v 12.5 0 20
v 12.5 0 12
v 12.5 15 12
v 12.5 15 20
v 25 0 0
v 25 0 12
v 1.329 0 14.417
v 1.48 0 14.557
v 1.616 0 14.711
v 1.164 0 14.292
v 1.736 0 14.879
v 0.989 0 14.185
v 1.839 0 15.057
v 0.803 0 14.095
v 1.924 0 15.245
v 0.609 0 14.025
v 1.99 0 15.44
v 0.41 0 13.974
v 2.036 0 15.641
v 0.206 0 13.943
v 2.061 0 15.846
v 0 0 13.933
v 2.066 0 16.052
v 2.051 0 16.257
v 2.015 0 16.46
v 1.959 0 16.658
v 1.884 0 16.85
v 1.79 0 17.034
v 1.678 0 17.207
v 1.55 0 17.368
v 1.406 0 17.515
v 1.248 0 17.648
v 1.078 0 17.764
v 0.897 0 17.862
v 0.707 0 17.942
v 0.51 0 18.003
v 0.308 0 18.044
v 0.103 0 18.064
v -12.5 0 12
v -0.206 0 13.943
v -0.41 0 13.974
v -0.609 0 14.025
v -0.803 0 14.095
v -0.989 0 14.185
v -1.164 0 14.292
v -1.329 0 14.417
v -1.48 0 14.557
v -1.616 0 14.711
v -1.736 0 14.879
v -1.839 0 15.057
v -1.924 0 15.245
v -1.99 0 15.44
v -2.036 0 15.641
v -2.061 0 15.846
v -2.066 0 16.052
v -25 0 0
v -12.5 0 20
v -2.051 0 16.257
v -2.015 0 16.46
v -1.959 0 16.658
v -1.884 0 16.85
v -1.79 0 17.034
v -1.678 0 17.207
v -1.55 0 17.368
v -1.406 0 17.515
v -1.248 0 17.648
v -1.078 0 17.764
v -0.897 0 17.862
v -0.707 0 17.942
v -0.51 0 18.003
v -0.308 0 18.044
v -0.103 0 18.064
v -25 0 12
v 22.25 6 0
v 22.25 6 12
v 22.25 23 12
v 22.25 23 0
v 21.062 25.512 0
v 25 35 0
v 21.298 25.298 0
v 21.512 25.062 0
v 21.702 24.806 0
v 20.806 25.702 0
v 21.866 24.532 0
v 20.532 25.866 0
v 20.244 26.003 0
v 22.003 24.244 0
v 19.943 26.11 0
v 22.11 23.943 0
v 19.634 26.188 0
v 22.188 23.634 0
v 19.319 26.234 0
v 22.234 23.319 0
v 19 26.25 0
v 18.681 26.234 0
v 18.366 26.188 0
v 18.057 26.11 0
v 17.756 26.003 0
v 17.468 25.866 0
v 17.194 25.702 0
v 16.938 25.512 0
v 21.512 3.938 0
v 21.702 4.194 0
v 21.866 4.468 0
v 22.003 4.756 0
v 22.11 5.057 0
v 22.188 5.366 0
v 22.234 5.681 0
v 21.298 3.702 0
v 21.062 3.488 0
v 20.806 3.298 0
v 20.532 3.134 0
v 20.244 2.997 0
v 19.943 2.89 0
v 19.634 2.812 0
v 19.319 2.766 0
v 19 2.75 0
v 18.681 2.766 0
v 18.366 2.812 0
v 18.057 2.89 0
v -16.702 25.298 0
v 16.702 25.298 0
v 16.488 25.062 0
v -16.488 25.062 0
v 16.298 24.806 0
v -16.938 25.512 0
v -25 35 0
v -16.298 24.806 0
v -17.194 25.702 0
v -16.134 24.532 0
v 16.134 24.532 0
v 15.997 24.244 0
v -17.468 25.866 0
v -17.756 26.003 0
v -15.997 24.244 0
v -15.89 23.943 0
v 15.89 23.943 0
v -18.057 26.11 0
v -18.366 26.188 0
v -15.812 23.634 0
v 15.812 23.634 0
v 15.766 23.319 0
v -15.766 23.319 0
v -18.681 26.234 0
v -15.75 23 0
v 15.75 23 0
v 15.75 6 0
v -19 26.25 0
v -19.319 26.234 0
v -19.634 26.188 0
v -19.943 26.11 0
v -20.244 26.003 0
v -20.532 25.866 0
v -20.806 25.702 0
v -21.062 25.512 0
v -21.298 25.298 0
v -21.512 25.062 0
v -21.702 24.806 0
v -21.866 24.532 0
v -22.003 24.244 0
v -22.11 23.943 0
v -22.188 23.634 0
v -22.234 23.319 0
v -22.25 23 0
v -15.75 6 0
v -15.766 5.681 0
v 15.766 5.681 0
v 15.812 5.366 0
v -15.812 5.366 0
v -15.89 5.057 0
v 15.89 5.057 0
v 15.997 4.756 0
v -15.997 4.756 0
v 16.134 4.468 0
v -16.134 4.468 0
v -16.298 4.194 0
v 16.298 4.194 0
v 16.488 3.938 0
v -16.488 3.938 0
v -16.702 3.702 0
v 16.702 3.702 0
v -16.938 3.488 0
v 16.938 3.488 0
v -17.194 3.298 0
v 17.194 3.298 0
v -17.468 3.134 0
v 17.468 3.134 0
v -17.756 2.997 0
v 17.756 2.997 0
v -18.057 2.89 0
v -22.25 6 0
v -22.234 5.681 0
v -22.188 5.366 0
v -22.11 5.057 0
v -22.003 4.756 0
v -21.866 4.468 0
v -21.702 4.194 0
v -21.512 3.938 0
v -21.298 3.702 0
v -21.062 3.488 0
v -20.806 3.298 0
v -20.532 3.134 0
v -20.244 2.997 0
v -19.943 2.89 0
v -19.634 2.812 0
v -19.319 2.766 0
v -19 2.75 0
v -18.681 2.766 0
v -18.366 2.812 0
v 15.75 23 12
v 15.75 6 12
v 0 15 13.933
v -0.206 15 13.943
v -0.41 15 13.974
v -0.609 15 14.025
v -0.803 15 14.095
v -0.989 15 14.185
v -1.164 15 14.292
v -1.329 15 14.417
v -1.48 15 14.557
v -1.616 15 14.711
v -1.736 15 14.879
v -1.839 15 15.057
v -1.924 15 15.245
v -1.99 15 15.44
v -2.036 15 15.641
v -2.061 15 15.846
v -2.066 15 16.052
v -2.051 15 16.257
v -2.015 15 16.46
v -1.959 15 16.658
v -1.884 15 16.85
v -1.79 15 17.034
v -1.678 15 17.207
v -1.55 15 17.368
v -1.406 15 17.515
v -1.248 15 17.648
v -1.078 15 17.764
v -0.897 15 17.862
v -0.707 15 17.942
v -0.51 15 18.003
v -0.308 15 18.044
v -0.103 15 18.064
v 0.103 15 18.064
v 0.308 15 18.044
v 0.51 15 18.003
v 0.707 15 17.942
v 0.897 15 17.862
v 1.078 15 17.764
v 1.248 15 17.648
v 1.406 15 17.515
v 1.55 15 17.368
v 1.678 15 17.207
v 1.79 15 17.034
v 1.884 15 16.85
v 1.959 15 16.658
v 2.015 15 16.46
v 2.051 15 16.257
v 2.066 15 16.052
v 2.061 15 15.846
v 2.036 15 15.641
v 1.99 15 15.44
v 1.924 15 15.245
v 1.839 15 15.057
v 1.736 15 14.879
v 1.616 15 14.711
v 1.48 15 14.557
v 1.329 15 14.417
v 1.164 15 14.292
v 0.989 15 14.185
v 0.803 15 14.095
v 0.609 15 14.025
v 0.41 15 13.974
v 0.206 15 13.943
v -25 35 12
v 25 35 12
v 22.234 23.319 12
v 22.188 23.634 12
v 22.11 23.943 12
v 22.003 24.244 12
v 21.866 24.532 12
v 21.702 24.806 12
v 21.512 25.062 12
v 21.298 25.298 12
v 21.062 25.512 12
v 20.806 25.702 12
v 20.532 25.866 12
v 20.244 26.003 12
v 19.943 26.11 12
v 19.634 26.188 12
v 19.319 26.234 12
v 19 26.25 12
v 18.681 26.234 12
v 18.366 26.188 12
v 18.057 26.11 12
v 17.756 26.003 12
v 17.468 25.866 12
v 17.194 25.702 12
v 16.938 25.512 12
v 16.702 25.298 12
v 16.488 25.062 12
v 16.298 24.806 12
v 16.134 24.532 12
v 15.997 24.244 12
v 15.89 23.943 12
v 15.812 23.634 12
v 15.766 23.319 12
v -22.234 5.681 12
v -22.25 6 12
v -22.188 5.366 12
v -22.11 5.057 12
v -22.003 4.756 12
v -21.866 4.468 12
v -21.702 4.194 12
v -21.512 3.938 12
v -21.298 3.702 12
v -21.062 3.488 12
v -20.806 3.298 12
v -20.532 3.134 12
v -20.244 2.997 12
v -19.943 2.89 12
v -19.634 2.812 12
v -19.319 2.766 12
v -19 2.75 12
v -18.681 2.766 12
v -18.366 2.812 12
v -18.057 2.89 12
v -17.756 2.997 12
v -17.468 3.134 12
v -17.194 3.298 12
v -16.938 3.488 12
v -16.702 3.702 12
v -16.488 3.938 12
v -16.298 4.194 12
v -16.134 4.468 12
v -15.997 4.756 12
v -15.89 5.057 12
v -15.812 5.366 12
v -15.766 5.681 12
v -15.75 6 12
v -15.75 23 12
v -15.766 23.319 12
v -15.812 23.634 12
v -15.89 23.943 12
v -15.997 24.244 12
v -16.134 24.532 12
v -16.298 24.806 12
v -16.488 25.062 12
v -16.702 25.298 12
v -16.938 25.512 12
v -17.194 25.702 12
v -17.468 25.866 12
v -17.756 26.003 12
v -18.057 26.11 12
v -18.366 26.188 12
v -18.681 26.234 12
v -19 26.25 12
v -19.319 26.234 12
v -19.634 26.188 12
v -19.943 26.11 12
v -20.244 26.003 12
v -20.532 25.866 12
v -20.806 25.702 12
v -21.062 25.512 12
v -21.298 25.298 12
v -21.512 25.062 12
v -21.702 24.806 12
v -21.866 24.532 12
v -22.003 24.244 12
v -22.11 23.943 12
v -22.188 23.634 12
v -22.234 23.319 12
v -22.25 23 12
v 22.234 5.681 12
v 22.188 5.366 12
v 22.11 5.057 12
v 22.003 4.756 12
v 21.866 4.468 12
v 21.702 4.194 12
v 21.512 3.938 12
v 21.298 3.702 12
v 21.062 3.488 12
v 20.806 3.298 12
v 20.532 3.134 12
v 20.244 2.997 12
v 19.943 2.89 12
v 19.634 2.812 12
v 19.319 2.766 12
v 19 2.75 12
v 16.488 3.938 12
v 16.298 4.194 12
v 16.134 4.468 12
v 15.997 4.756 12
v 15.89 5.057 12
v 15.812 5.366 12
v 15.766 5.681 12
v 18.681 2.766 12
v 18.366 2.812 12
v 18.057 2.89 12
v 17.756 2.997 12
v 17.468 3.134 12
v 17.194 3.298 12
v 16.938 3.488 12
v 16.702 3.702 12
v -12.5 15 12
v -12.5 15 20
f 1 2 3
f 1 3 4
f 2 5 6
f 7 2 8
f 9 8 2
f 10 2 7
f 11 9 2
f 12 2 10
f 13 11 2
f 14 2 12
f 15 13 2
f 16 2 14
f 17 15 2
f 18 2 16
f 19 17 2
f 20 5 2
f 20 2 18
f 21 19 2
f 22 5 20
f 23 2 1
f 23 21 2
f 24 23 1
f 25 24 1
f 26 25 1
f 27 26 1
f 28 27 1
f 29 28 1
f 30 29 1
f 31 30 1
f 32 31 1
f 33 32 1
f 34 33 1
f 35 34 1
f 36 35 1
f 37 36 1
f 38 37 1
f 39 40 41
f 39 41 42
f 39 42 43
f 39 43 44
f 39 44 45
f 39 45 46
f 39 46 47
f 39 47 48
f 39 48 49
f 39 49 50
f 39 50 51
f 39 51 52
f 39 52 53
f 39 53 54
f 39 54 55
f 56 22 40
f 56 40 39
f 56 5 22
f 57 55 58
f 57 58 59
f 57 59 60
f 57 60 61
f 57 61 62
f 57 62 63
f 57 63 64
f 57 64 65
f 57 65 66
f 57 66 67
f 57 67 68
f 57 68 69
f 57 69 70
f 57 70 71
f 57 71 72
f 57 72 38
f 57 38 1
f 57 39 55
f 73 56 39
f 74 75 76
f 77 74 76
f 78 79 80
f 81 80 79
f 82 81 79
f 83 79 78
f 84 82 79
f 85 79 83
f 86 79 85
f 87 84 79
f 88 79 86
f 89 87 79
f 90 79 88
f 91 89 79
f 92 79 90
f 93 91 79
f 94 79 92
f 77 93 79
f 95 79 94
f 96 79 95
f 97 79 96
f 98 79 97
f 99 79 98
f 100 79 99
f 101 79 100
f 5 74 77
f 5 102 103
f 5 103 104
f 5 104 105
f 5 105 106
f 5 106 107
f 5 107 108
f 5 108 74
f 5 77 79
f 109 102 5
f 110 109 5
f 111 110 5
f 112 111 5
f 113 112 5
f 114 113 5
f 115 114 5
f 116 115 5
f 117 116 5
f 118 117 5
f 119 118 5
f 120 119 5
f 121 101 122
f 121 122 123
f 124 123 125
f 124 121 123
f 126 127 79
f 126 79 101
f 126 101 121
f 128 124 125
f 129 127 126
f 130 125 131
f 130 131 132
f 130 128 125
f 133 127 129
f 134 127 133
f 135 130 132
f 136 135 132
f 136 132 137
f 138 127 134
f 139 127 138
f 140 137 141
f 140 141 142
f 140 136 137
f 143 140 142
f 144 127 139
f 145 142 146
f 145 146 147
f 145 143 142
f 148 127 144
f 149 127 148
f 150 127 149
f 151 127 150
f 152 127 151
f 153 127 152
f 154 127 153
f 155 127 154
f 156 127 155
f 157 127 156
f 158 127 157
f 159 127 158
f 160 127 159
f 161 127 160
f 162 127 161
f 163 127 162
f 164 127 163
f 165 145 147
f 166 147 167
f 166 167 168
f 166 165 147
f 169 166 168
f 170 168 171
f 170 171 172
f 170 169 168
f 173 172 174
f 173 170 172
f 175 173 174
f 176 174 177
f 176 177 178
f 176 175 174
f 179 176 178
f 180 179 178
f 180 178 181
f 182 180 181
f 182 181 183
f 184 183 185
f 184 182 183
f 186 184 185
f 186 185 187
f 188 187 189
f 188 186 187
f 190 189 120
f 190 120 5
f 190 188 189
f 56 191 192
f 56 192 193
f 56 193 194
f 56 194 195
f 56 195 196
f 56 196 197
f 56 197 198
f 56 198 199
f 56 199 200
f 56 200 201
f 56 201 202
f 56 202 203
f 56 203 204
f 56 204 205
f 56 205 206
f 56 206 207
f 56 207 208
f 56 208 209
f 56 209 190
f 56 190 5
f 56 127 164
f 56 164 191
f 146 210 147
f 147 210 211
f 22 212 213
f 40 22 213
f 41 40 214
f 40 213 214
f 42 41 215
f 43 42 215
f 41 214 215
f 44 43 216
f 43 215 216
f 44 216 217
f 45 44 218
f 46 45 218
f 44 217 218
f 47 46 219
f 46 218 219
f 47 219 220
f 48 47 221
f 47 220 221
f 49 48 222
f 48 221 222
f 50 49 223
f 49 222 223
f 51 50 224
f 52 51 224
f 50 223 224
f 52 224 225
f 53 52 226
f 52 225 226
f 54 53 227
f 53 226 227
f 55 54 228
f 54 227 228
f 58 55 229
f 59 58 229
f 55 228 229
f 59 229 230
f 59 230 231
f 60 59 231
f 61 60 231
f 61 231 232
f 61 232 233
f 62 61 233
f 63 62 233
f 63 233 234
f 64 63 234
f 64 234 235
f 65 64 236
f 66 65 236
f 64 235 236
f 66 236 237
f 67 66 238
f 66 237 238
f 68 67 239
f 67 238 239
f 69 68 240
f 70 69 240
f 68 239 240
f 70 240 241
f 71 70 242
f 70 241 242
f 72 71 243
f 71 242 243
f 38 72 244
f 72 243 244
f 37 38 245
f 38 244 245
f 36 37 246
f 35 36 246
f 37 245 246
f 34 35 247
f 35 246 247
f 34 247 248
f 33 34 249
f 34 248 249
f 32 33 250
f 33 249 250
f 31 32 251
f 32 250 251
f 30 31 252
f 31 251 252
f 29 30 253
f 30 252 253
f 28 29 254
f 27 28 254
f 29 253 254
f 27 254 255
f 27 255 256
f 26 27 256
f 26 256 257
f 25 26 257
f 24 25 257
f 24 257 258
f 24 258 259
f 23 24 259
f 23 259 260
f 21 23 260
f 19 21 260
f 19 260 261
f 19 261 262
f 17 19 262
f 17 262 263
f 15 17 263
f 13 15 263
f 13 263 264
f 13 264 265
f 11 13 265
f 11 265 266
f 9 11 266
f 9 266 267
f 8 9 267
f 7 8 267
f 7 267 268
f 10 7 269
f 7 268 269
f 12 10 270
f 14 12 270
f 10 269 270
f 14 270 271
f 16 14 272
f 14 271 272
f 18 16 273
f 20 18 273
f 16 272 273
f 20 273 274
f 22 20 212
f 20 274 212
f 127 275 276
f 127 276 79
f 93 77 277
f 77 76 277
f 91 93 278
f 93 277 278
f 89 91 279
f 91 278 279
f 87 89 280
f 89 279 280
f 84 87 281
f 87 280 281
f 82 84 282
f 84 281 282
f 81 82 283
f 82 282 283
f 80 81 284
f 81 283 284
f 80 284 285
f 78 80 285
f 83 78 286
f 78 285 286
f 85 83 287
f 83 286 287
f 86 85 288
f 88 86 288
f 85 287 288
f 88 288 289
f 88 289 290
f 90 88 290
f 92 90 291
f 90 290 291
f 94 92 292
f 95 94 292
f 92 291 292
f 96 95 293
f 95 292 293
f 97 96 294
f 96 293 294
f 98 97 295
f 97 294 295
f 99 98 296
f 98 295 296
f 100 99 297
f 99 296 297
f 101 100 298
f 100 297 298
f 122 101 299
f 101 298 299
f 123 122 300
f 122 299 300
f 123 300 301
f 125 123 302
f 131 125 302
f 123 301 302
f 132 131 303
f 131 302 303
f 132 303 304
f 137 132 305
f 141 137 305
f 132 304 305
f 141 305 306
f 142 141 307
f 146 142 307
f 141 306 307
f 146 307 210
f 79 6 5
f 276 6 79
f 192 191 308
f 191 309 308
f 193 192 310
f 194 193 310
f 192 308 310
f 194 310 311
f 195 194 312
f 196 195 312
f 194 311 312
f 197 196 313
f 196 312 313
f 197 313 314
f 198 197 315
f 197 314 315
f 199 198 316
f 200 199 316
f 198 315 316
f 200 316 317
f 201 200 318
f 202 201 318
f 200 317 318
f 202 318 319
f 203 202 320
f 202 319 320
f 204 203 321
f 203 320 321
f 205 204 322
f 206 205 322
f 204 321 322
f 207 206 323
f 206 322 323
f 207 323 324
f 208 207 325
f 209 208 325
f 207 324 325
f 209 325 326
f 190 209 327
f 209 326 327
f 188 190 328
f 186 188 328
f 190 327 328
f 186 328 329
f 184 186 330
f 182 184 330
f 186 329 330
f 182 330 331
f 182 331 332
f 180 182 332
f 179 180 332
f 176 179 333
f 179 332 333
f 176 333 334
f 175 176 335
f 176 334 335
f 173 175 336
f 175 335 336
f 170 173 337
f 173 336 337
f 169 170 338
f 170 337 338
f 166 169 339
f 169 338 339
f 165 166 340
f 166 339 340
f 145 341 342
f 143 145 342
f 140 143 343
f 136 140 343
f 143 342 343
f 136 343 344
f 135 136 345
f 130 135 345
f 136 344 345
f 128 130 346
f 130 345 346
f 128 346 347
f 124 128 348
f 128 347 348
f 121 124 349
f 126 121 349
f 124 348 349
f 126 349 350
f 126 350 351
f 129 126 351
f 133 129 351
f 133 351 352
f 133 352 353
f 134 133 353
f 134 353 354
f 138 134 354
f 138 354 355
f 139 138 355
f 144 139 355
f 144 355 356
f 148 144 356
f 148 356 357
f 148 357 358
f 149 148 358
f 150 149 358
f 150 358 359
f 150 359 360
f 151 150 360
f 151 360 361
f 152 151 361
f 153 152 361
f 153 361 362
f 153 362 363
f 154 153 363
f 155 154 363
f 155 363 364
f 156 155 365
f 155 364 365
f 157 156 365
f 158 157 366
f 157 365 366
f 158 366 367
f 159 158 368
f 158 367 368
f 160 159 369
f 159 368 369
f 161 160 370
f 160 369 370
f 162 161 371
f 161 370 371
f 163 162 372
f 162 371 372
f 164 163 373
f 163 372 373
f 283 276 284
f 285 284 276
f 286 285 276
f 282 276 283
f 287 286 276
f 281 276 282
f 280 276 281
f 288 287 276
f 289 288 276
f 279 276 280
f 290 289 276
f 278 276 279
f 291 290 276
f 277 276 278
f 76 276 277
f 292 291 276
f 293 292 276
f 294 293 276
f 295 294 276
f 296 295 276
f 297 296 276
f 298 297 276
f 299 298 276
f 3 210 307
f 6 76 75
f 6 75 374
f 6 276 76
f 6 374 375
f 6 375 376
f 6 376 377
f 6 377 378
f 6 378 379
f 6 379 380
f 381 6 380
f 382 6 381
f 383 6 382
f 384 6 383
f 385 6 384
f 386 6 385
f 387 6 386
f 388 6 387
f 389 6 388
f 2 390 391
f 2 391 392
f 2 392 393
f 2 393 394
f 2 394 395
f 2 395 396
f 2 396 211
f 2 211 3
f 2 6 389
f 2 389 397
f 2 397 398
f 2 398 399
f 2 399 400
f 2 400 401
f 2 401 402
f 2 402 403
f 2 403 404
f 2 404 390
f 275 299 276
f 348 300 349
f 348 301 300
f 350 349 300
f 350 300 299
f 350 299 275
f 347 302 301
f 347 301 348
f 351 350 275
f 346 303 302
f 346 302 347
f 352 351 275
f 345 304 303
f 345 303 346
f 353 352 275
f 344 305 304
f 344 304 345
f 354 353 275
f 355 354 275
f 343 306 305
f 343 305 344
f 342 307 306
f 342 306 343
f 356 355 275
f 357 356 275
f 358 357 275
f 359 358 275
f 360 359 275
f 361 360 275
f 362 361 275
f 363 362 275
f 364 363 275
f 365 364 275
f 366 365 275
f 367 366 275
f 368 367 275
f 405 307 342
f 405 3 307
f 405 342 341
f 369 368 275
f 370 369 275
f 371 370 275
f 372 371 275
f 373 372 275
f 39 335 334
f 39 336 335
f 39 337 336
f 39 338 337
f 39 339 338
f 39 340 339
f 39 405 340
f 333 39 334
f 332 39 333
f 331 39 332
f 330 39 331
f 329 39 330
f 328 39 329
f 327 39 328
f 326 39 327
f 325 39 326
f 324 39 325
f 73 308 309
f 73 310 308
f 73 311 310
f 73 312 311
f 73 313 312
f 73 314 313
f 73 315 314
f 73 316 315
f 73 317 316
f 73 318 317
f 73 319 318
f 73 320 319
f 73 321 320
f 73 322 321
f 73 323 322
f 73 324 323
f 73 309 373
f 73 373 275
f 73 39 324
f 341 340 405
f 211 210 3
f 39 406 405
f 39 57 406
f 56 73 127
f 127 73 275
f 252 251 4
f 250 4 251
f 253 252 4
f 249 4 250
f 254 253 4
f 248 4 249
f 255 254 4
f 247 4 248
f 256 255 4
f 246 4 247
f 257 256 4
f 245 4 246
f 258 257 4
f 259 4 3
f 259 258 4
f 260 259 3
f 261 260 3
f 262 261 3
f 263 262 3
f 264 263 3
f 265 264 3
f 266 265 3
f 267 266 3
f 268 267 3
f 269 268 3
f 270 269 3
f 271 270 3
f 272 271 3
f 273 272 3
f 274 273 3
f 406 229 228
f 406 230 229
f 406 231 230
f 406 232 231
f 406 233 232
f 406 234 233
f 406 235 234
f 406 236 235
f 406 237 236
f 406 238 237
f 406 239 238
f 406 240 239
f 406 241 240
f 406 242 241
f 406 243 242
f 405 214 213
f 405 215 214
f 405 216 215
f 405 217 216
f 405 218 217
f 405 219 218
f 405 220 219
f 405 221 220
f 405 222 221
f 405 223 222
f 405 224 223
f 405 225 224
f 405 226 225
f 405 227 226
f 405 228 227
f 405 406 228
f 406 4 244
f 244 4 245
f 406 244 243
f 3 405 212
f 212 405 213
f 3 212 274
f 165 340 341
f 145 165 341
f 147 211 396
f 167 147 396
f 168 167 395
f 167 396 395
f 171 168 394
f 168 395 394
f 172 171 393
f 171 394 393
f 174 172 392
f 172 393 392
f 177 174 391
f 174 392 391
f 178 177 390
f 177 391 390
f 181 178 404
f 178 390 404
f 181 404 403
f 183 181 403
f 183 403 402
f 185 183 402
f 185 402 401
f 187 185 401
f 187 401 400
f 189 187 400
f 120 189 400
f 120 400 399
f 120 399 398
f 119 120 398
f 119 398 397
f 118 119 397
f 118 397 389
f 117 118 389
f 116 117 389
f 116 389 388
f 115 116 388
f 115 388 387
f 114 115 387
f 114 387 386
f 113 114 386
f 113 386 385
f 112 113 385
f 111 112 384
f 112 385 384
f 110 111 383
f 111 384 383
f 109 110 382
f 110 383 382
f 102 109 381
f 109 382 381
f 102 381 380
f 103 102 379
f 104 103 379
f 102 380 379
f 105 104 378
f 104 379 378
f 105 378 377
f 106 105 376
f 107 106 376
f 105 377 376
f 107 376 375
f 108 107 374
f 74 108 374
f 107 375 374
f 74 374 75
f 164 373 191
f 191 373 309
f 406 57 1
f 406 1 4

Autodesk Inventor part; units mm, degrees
ref_plane "YZ Plane" through (0, 0, 0) normal (1, 0, 0) x (0, 1, 0)
ref_plane "XZ Plane" through (0, 0, 0) normal (0, 1, 0) x (-1, 0, 0)
ref_plane "XY Plane" through (0, 0, 0) normal (0, 0, 1) x (1, 0, 0)
sketch "Sketch1" plane through (0, 0, 0) normal (1, 0, 0) x (0, 1, 0)
  line L0 (0, 20) -> (15, 20)
  line L1 (15, 20) -> (15, 12)
  line L2 (15, 12) -> (35, 12)
  line L3 (35, 12) -> (35, 0)
  line L4 (35, 0) -> (0, 0)
  line L5 (0, 0) -> (0, 20)
  dimension "d0" = 35
  dimension "d30" = 20
  dimension "d31" = 8
  dimension "d33" = 20
extrude "Extrusion1" add sketch "Sketch1" along normal mid plane 50
sketch "Sketch2" plane through (-25, 0, 0) normal (0, -1, 0) x (1, 0, 0)
  line L0 (0, 20) -> (12.5, 20)
  line L1 (12.5, 20) -> (12.5, 12)
  line L2 (12.5, 12) -> (0, 12)
  line L3 (0, 12) -> (0, 20)
  line L4 (37.5, 20) -> (50, 20)
  line L5 (50, 20) -> (50, 12)
  line L6 (50, 12) -> (37.5, 12)
  line L7 (37.5, 12) -> (37.5, 20)
  line L8 (0, 20) -> (50, 20) projected
  line L9 (50, 12) -> (0, 12) projected
  dimension "d15" = 25
extrude "Extrusion2" cut sketch "Sketch2" against normal through all contours L0 L1 L2 L3 | L4 L5 L6 L7
sketch "Sketch4" plane through (-25, 35, 12) normal (0, 0, 1) x (1, 0, 0)
  line L0 (6, -29) -> (6, -12) construction
  line L1 (9.25, -29) -> (9.25, -12)
  line L2 (2.75, -12) -> (2.75, -29)
  arc A0 (2.75, -29) -> (9.25, -29) centre (6, -29) ccw
  arc A1 (9.25, -12) -> (2.75, -12) centre (6, -12) ccw
  line L3 (12.5, -35) -> (0, -35) projected
  line L4 (0, -35) -> (0, 0) projected
  point P0 (6, -20.5)
  dimension "d24" = 6.5
  dimension "d25" = 17
  dimension "d38" = 6
  dimension "d39" = 6
extrude "Extrusion3" cut sketch "Sketch4" against normal through all
mirror "Mirror1" about plane through (0, 0, 0) normal (1, 0, 0) of "Extrusion3"
sketch "Sketch5" plane through (-25, 0, 0) normal (0, -1, 0) x (1, 0, 0)
  line L0 (12.5, 20) -> (37.5, 20) projected
  point P0 (25, 0)
  point P1 (25, 16)
  point P2 (25, 20)
  dimension "d40" = 4
hole "Hole1" at (0, 0, 16) direction (0, 1, 0) diameter 4.134 end through all thread size "M5x0.8" designation "M5" class "6H" standard "ISO Metric profile"
properties part number "Clamping Block" material "Aluminum 6061"
